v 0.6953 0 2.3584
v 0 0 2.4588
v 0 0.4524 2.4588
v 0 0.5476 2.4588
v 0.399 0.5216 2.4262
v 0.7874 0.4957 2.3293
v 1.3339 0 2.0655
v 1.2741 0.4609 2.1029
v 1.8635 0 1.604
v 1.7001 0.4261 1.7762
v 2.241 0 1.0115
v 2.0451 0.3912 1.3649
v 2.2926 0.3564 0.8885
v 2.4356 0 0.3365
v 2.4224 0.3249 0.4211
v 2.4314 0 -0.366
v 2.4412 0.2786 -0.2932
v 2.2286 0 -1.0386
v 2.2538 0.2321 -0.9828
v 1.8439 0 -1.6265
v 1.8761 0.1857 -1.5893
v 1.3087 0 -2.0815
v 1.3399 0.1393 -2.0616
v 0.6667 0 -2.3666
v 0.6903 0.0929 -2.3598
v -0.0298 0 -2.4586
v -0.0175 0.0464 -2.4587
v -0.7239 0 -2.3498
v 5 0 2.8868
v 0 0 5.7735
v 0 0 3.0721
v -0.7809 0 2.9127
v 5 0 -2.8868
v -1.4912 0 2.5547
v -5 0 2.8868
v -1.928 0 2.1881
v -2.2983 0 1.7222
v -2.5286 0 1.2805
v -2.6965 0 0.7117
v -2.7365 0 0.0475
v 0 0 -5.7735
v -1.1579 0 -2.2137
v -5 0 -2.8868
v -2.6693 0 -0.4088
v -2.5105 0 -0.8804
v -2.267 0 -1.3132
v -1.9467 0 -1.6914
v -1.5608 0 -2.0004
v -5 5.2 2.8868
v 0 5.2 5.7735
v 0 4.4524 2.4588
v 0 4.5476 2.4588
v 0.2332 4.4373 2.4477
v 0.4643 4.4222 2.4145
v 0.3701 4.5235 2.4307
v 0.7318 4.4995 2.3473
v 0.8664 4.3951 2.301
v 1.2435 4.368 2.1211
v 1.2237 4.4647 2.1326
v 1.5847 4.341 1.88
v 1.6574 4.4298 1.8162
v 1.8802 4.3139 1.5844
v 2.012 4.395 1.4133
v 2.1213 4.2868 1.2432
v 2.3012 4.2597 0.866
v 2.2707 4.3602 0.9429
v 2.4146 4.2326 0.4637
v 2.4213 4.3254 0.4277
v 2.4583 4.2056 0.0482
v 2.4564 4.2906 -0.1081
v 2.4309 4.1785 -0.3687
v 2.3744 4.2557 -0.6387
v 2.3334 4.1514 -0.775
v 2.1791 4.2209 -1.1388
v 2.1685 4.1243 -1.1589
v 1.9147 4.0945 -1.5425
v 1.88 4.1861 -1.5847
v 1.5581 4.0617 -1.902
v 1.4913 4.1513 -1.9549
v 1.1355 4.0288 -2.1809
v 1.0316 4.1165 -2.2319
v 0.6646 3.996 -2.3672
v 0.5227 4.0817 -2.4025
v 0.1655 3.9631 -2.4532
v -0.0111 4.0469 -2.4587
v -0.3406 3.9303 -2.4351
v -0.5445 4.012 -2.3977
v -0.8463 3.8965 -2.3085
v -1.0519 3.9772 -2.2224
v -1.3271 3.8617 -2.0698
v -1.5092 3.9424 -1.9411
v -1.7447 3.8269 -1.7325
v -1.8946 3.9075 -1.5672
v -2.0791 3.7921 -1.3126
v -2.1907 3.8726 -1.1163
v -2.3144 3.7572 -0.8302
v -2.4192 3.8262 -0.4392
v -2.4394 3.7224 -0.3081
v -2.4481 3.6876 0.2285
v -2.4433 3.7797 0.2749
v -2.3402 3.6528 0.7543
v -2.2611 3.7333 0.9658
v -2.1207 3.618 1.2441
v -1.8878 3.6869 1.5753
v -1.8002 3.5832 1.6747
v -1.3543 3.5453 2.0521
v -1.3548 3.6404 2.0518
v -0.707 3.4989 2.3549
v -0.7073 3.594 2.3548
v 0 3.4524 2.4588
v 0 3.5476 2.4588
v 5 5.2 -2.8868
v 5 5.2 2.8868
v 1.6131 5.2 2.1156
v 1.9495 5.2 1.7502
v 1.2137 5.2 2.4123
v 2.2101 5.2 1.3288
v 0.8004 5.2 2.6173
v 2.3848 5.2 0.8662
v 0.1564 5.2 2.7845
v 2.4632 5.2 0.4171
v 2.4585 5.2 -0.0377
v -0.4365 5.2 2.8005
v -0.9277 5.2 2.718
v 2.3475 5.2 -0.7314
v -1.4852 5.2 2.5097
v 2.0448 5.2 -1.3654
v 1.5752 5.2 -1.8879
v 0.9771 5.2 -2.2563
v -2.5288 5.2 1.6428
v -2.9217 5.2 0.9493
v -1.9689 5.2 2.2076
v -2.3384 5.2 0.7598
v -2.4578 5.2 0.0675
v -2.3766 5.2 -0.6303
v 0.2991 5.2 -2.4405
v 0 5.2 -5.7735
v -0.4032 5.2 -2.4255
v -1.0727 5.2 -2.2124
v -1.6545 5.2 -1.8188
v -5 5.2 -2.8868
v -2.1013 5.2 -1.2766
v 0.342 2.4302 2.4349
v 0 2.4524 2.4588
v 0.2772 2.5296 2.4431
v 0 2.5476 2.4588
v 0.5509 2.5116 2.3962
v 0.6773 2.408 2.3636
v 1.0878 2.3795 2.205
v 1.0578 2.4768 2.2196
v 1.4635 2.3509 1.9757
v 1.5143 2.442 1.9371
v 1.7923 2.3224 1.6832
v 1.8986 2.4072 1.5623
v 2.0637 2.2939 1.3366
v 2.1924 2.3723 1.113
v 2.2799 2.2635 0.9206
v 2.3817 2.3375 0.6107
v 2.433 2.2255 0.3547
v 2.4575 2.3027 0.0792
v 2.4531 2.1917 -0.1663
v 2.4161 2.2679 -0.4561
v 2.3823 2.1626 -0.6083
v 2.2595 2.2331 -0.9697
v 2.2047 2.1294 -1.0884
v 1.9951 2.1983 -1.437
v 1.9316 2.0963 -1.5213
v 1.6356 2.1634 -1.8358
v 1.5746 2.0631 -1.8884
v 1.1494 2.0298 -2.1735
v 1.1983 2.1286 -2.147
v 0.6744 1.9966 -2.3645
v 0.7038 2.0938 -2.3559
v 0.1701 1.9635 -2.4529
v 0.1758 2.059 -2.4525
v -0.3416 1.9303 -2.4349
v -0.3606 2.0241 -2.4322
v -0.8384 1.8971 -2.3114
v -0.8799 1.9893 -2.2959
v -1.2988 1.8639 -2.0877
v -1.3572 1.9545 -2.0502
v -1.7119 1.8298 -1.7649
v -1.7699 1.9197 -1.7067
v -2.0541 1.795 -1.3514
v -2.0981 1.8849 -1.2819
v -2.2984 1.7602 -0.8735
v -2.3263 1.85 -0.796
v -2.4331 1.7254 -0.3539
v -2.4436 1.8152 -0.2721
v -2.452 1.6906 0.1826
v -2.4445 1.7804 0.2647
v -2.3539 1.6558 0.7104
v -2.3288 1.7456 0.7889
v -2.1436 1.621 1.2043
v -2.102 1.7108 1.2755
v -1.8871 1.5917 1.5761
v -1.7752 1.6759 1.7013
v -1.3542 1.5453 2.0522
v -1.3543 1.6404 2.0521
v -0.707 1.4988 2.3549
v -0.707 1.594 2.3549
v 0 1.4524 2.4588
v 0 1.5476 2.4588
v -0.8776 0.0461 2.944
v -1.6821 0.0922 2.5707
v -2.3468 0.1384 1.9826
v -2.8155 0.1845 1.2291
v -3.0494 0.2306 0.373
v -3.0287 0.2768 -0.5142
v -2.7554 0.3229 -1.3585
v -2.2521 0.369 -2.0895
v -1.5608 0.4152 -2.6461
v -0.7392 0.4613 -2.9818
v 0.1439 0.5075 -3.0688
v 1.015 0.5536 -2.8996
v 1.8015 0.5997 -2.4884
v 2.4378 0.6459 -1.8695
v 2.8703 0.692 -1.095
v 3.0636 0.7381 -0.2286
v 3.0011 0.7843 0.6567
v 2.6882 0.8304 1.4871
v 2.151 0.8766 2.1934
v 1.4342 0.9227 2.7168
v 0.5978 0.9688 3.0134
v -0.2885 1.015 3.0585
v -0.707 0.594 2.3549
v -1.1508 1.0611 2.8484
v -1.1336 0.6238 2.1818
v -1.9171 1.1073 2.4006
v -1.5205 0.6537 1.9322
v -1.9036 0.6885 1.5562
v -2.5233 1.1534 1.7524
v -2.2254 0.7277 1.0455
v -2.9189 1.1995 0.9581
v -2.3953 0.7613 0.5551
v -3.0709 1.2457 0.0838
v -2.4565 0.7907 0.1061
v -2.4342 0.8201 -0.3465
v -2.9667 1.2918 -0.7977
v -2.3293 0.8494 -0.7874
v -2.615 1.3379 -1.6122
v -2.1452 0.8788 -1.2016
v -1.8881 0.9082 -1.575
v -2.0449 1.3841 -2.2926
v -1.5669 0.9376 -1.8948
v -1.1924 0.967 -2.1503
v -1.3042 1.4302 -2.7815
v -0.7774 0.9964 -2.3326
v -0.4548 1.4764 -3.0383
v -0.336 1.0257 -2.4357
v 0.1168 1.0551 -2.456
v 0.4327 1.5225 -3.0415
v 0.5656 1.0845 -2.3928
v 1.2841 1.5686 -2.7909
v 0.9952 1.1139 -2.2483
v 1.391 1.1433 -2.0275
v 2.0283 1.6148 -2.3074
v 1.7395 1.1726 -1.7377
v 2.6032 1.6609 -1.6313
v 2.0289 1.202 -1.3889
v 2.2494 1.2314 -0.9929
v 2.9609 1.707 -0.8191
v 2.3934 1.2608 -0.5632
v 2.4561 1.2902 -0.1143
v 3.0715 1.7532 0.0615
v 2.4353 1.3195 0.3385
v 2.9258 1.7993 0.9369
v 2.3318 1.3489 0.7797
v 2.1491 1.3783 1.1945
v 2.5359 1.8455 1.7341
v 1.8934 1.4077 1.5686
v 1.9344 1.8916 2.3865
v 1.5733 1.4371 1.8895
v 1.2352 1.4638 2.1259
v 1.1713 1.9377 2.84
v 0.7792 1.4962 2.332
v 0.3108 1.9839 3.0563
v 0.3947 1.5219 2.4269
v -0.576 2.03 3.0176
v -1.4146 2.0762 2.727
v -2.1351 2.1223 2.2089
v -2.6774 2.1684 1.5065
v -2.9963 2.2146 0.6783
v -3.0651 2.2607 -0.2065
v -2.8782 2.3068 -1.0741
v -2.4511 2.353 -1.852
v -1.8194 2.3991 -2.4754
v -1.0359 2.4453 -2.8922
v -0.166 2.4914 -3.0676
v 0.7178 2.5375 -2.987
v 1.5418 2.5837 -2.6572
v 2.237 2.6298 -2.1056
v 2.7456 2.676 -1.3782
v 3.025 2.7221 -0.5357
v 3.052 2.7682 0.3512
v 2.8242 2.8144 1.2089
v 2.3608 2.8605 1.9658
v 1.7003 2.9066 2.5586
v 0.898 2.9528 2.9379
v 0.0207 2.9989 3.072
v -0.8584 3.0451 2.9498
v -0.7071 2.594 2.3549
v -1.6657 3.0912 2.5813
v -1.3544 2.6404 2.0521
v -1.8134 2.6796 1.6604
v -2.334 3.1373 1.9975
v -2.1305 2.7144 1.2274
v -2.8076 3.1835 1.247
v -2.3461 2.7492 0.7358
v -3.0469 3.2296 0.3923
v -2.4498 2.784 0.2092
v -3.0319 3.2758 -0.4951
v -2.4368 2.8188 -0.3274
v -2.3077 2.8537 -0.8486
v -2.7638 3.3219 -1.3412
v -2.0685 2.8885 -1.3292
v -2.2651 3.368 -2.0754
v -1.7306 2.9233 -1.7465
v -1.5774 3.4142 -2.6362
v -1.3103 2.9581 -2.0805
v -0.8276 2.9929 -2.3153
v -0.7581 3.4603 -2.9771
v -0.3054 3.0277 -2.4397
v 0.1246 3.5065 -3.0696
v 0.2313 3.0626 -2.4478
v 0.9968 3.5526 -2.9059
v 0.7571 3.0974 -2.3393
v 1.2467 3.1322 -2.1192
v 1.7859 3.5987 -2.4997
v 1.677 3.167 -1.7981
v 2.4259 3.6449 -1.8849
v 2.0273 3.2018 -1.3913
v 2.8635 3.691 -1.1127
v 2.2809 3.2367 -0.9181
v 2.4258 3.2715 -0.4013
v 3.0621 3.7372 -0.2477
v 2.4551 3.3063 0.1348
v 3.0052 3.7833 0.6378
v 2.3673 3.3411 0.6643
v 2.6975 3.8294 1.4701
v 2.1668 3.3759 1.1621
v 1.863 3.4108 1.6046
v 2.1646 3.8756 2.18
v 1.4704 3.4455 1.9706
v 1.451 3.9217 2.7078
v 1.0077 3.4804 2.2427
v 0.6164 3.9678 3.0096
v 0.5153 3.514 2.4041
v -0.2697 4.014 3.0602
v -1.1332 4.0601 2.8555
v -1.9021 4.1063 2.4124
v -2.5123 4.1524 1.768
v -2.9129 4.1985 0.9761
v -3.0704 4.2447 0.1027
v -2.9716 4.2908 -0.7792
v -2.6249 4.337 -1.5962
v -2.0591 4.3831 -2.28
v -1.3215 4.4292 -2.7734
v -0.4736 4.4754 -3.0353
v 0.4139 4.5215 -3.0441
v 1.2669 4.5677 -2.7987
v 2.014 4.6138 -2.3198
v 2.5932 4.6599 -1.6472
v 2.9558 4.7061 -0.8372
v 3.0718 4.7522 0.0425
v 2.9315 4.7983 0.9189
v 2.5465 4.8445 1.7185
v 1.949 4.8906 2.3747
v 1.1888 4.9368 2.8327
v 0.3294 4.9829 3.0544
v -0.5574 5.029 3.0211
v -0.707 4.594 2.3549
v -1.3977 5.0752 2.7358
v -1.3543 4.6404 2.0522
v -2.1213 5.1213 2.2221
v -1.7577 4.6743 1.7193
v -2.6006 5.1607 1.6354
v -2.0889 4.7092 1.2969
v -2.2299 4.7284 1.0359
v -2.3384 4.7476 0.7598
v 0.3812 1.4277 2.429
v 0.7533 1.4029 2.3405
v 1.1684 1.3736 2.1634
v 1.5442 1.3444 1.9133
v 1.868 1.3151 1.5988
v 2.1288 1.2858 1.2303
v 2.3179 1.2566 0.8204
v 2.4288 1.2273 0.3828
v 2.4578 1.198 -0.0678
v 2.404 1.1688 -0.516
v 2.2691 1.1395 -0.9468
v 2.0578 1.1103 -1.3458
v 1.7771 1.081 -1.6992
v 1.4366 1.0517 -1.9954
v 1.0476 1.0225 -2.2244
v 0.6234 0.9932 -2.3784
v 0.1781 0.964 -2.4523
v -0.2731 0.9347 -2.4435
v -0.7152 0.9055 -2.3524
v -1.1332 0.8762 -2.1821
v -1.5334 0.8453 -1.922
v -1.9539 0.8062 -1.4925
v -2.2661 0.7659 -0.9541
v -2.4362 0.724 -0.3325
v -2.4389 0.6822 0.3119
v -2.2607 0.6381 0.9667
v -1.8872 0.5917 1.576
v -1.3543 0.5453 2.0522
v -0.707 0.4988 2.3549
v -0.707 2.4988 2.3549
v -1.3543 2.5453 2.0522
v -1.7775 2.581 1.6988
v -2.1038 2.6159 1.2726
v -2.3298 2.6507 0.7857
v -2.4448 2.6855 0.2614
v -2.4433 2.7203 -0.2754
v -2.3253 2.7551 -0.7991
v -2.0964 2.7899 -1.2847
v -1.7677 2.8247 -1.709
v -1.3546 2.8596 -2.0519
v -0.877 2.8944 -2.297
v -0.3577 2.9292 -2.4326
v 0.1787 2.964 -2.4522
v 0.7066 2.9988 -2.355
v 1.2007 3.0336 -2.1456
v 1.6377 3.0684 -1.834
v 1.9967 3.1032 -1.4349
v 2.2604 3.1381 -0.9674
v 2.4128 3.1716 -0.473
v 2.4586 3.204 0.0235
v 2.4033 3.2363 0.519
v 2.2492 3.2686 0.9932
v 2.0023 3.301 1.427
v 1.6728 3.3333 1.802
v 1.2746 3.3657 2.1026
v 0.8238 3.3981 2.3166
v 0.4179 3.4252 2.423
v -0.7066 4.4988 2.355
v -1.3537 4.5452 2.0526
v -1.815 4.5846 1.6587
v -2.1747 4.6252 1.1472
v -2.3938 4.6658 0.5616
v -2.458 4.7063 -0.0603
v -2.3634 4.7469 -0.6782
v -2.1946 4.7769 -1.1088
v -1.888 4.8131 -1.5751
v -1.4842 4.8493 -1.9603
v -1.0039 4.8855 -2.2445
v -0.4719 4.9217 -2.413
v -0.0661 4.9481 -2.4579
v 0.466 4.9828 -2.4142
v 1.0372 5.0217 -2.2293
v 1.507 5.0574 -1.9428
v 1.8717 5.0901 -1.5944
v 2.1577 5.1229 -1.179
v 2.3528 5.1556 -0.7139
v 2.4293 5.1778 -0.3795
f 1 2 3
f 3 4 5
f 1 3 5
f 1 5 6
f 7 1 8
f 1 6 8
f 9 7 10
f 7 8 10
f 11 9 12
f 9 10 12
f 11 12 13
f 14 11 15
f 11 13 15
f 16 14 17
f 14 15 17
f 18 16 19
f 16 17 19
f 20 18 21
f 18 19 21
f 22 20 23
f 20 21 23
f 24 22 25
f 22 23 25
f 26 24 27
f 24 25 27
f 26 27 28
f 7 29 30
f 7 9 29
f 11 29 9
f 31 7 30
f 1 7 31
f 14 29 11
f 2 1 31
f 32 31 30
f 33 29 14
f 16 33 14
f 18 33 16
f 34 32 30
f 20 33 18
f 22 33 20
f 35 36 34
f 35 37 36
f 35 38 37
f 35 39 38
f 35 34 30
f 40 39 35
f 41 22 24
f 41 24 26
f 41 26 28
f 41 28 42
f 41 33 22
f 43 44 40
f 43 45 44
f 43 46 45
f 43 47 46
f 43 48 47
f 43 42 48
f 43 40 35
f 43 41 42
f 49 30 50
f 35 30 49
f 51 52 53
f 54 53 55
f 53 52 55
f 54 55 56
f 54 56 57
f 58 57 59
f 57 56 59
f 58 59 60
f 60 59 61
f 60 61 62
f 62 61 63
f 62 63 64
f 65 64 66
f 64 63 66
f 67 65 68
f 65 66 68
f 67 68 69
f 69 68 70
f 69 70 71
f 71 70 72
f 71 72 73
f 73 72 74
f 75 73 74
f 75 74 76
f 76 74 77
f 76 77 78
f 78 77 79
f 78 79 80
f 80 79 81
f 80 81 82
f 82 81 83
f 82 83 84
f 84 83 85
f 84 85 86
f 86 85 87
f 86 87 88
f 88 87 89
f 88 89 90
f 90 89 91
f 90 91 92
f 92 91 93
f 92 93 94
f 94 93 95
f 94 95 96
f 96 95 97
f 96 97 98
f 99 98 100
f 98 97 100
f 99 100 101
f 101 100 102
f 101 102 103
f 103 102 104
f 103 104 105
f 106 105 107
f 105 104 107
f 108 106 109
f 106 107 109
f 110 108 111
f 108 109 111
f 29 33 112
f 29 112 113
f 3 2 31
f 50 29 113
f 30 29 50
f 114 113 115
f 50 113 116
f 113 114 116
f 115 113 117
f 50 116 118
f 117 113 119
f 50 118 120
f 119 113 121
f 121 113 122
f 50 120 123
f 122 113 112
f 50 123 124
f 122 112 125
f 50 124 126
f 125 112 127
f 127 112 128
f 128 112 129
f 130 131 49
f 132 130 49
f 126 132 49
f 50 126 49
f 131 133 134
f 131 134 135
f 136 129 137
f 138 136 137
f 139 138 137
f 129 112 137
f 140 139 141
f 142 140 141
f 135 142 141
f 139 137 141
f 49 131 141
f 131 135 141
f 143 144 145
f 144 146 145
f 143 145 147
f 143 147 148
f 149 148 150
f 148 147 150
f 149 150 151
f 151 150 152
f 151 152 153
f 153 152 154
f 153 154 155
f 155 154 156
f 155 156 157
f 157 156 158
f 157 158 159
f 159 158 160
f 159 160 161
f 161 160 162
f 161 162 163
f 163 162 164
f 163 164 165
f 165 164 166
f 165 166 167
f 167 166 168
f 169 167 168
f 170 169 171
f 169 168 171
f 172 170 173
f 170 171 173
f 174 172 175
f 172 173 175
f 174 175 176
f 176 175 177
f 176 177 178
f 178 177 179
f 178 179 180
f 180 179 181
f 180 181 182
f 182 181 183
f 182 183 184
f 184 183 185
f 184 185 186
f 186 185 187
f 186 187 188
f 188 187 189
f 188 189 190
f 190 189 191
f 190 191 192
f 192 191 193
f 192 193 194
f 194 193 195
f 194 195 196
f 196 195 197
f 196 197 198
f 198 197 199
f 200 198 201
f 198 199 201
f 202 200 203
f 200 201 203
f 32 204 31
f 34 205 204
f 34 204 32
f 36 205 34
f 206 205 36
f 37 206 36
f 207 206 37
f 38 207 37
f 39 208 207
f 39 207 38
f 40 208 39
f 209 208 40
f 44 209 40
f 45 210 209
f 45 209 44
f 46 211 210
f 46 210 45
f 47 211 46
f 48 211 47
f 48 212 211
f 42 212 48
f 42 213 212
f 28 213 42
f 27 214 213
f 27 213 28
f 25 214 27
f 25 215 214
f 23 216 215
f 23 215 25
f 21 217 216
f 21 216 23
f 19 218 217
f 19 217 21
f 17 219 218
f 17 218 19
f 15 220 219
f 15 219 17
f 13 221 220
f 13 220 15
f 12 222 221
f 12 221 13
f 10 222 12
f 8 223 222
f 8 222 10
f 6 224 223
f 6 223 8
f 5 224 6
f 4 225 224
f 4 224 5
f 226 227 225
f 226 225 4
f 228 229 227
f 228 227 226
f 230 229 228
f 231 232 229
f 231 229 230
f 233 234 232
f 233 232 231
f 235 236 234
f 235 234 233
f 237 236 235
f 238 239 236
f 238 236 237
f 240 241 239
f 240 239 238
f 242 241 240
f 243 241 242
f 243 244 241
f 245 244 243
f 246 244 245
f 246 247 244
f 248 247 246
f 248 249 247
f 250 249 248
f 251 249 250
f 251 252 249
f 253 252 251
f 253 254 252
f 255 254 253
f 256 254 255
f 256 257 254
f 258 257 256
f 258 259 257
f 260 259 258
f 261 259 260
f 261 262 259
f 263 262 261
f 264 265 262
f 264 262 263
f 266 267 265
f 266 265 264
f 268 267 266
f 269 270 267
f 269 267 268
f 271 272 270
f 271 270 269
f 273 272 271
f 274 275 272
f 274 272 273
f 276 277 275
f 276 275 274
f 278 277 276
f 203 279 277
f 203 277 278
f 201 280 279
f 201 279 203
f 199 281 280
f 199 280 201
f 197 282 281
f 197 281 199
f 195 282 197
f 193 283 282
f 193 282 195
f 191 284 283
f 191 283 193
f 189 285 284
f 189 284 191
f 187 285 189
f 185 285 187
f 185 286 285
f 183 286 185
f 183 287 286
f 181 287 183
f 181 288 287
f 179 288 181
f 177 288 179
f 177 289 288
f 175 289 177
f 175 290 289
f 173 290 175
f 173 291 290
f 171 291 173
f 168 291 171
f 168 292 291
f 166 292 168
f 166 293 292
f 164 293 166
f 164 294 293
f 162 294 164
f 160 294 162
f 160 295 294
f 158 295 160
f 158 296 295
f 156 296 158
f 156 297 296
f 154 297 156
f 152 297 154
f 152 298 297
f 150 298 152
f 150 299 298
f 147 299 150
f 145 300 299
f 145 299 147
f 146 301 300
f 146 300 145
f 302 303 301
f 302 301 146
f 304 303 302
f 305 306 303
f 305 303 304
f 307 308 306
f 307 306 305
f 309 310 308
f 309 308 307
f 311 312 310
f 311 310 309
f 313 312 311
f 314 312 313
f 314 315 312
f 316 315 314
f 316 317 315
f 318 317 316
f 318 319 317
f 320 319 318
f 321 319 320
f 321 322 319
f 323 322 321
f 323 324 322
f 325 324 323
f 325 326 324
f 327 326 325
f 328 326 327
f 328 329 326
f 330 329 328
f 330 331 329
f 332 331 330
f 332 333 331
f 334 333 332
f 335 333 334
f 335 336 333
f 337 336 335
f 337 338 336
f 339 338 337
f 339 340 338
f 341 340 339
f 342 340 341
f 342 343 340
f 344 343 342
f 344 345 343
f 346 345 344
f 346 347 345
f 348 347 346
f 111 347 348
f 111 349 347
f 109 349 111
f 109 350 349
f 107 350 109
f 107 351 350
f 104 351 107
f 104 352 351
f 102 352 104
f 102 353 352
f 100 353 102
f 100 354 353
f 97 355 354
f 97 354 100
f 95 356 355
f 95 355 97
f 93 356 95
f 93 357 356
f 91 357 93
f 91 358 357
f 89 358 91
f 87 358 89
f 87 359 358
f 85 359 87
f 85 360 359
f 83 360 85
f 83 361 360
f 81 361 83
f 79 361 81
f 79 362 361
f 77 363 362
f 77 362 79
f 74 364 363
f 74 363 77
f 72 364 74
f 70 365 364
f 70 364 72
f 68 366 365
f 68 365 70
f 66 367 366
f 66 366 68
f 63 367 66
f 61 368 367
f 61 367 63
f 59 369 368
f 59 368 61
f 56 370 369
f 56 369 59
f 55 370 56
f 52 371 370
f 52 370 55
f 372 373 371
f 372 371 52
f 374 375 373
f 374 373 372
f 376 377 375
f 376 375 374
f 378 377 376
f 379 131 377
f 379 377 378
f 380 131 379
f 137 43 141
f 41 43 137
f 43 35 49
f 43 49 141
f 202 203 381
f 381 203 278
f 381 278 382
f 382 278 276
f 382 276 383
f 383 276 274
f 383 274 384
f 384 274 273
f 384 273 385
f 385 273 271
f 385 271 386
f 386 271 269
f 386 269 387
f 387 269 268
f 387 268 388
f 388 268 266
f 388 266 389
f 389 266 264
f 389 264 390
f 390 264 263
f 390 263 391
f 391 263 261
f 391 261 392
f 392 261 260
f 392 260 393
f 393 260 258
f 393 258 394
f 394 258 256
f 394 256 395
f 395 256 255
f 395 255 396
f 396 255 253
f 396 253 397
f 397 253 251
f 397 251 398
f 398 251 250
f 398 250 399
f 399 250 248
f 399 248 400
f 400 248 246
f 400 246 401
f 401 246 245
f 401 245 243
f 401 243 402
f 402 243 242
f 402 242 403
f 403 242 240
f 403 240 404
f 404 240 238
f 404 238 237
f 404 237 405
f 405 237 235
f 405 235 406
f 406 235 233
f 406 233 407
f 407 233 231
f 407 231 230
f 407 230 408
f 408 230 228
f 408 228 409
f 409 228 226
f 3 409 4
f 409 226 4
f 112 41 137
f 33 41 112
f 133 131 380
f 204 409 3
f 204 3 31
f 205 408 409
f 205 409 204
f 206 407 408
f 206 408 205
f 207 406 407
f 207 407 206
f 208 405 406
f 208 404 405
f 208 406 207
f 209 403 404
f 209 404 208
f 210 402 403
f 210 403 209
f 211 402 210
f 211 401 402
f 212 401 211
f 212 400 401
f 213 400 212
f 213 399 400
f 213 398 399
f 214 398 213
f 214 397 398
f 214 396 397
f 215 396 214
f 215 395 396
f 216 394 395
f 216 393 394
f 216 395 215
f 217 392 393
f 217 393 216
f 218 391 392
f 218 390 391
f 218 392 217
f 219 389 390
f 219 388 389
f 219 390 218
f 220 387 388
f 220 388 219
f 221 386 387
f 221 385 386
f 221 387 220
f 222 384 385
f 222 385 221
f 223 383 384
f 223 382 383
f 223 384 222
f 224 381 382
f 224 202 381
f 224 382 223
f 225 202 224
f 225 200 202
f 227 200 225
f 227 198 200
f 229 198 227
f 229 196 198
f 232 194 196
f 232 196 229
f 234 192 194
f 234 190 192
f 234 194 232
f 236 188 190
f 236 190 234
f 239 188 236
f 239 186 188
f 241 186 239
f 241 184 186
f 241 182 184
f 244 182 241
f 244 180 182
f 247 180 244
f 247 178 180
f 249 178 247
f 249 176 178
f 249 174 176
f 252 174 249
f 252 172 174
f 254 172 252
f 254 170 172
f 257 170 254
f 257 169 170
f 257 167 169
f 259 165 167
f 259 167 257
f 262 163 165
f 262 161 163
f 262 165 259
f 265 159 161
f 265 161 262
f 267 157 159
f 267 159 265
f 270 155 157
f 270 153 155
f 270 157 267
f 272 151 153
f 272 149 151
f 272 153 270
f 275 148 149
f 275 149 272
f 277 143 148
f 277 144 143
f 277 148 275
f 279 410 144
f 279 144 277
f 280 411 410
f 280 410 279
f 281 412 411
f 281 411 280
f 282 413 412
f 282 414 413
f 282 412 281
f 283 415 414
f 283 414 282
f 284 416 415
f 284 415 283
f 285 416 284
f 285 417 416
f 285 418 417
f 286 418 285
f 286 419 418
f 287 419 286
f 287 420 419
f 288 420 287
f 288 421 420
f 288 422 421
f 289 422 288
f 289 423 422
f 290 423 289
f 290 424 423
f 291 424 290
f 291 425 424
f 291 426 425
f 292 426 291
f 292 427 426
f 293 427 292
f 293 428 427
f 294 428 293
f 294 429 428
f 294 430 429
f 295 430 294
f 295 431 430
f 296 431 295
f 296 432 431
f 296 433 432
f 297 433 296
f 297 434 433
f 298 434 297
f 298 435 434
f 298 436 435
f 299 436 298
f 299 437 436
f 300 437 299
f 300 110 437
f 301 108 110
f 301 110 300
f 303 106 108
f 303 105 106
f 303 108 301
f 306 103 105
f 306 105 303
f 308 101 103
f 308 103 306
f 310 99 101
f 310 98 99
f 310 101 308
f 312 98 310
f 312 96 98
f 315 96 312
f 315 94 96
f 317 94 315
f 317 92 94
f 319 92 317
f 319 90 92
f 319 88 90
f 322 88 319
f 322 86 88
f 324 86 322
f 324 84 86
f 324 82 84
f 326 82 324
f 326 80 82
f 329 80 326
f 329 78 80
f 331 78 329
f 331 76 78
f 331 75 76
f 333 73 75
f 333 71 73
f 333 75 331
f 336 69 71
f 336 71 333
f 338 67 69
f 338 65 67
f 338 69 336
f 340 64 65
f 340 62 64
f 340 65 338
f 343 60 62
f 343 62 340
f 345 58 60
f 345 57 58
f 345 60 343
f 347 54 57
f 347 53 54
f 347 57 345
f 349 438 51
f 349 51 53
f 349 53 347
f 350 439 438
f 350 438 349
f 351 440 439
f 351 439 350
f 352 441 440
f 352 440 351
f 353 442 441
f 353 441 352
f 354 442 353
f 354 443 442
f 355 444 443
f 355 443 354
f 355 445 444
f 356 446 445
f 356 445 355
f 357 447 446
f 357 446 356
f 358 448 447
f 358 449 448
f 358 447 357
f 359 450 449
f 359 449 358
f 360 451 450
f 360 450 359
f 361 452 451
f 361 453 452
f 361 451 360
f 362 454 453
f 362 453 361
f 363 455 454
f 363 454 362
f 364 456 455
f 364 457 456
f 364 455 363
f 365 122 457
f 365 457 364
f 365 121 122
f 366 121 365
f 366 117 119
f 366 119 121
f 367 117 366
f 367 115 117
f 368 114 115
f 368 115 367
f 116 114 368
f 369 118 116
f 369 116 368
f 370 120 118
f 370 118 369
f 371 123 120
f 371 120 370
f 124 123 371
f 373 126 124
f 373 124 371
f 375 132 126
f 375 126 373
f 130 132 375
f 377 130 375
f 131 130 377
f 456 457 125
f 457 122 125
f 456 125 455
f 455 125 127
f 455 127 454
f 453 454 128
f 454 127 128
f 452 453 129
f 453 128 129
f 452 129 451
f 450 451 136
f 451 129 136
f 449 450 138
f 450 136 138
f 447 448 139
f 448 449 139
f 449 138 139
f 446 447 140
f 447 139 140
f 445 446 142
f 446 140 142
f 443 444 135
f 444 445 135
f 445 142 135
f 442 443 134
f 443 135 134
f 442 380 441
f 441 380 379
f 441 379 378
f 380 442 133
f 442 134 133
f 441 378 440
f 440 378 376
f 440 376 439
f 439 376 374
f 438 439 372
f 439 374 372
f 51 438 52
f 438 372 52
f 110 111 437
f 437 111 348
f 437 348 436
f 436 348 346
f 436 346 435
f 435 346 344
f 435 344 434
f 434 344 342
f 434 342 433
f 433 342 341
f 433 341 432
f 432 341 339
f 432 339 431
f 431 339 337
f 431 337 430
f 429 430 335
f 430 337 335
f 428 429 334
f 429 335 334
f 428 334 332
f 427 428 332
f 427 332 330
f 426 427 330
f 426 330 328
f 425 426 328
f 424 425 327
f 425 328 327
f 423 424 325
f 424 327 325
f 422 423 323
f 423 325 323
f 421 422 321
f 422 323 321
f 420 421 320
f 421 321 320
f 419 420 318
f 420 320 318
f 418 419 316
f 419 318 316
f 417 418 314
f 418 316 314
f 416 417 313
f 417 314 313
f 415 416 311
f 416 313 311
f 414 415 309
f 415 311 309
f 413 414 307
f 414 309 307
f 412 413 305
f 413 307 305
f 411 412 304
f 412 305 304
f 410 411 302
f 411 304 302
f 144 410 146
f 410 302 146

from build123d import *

# Parameters (mm, degrees)
HEXAGONO_DEPTH      = 5.2
TALADRO_PROFILE_R   = 2.45875
ROSCA_M6X1_0_PITCH  = 1
ROSCA_M6X1_0_HEIGHT = 5.2
ROSCA_M6X1_0_RADIUS = 2.4587


with BuildPart() as part:
    # Sk_Hexagono → Hexagono (new body)
    with BuildSketch(Plane(origin=(0, 0, 0), x_dir=(1, 0, 0), z_dir=(0, 1, 0))):
        Polygon((5, -2.886751346), (0, -5.773502692), (-5, -2.886751346), (-5, 2.886751346), (0, 5.773502692), (5, 2.886751346), align=None)
    extrude(amount=HEXAGONO_DEPTH)

    # Taladro: sweep along a curve in space
    with BuildLine() as taladro_path:
        Line((0, -1, 0), (0, 6.2, 0))
    # Taladro profile (on start of the path) → Taladro (sweep, cut)
    with BuildSketch(Plane.ZX.offset(-1)):
        Circle(TALADRO_PROFILE_R)
    sweep(path=taladro_path.line, mode=Mode.SUBTRACT)

    # Rosca_M6x1,0: sweep along a helix
    with BuildLine() as rosca_m6x1_0_path:
        Helix(ROSCA_M6X1_0_PITCH, ROSCA_M6X1_0_HEIGHT, ROSCA_M6X1_0_RADIUS, center=(0, 0, 0), direction=(0, 1, 0), lefthand=True)
    # Sk_Perfil_rosca → Rosca_M6x1,0 (sweep, cut)
    with BuildSketch(Plane(origin=(0, 0, 0), x_dir=(0, 0, -1), z_dir=(1, 0, 0))):
        Polygon((-2.2587, -0.6), (-3.0721, 0), (-2.2587, 0.6), align=None)
    sweep(path=rosca_m6x1_0_path.line, is_frenet=True, mode=Mode.SUBTRACT)


solid = part.part
